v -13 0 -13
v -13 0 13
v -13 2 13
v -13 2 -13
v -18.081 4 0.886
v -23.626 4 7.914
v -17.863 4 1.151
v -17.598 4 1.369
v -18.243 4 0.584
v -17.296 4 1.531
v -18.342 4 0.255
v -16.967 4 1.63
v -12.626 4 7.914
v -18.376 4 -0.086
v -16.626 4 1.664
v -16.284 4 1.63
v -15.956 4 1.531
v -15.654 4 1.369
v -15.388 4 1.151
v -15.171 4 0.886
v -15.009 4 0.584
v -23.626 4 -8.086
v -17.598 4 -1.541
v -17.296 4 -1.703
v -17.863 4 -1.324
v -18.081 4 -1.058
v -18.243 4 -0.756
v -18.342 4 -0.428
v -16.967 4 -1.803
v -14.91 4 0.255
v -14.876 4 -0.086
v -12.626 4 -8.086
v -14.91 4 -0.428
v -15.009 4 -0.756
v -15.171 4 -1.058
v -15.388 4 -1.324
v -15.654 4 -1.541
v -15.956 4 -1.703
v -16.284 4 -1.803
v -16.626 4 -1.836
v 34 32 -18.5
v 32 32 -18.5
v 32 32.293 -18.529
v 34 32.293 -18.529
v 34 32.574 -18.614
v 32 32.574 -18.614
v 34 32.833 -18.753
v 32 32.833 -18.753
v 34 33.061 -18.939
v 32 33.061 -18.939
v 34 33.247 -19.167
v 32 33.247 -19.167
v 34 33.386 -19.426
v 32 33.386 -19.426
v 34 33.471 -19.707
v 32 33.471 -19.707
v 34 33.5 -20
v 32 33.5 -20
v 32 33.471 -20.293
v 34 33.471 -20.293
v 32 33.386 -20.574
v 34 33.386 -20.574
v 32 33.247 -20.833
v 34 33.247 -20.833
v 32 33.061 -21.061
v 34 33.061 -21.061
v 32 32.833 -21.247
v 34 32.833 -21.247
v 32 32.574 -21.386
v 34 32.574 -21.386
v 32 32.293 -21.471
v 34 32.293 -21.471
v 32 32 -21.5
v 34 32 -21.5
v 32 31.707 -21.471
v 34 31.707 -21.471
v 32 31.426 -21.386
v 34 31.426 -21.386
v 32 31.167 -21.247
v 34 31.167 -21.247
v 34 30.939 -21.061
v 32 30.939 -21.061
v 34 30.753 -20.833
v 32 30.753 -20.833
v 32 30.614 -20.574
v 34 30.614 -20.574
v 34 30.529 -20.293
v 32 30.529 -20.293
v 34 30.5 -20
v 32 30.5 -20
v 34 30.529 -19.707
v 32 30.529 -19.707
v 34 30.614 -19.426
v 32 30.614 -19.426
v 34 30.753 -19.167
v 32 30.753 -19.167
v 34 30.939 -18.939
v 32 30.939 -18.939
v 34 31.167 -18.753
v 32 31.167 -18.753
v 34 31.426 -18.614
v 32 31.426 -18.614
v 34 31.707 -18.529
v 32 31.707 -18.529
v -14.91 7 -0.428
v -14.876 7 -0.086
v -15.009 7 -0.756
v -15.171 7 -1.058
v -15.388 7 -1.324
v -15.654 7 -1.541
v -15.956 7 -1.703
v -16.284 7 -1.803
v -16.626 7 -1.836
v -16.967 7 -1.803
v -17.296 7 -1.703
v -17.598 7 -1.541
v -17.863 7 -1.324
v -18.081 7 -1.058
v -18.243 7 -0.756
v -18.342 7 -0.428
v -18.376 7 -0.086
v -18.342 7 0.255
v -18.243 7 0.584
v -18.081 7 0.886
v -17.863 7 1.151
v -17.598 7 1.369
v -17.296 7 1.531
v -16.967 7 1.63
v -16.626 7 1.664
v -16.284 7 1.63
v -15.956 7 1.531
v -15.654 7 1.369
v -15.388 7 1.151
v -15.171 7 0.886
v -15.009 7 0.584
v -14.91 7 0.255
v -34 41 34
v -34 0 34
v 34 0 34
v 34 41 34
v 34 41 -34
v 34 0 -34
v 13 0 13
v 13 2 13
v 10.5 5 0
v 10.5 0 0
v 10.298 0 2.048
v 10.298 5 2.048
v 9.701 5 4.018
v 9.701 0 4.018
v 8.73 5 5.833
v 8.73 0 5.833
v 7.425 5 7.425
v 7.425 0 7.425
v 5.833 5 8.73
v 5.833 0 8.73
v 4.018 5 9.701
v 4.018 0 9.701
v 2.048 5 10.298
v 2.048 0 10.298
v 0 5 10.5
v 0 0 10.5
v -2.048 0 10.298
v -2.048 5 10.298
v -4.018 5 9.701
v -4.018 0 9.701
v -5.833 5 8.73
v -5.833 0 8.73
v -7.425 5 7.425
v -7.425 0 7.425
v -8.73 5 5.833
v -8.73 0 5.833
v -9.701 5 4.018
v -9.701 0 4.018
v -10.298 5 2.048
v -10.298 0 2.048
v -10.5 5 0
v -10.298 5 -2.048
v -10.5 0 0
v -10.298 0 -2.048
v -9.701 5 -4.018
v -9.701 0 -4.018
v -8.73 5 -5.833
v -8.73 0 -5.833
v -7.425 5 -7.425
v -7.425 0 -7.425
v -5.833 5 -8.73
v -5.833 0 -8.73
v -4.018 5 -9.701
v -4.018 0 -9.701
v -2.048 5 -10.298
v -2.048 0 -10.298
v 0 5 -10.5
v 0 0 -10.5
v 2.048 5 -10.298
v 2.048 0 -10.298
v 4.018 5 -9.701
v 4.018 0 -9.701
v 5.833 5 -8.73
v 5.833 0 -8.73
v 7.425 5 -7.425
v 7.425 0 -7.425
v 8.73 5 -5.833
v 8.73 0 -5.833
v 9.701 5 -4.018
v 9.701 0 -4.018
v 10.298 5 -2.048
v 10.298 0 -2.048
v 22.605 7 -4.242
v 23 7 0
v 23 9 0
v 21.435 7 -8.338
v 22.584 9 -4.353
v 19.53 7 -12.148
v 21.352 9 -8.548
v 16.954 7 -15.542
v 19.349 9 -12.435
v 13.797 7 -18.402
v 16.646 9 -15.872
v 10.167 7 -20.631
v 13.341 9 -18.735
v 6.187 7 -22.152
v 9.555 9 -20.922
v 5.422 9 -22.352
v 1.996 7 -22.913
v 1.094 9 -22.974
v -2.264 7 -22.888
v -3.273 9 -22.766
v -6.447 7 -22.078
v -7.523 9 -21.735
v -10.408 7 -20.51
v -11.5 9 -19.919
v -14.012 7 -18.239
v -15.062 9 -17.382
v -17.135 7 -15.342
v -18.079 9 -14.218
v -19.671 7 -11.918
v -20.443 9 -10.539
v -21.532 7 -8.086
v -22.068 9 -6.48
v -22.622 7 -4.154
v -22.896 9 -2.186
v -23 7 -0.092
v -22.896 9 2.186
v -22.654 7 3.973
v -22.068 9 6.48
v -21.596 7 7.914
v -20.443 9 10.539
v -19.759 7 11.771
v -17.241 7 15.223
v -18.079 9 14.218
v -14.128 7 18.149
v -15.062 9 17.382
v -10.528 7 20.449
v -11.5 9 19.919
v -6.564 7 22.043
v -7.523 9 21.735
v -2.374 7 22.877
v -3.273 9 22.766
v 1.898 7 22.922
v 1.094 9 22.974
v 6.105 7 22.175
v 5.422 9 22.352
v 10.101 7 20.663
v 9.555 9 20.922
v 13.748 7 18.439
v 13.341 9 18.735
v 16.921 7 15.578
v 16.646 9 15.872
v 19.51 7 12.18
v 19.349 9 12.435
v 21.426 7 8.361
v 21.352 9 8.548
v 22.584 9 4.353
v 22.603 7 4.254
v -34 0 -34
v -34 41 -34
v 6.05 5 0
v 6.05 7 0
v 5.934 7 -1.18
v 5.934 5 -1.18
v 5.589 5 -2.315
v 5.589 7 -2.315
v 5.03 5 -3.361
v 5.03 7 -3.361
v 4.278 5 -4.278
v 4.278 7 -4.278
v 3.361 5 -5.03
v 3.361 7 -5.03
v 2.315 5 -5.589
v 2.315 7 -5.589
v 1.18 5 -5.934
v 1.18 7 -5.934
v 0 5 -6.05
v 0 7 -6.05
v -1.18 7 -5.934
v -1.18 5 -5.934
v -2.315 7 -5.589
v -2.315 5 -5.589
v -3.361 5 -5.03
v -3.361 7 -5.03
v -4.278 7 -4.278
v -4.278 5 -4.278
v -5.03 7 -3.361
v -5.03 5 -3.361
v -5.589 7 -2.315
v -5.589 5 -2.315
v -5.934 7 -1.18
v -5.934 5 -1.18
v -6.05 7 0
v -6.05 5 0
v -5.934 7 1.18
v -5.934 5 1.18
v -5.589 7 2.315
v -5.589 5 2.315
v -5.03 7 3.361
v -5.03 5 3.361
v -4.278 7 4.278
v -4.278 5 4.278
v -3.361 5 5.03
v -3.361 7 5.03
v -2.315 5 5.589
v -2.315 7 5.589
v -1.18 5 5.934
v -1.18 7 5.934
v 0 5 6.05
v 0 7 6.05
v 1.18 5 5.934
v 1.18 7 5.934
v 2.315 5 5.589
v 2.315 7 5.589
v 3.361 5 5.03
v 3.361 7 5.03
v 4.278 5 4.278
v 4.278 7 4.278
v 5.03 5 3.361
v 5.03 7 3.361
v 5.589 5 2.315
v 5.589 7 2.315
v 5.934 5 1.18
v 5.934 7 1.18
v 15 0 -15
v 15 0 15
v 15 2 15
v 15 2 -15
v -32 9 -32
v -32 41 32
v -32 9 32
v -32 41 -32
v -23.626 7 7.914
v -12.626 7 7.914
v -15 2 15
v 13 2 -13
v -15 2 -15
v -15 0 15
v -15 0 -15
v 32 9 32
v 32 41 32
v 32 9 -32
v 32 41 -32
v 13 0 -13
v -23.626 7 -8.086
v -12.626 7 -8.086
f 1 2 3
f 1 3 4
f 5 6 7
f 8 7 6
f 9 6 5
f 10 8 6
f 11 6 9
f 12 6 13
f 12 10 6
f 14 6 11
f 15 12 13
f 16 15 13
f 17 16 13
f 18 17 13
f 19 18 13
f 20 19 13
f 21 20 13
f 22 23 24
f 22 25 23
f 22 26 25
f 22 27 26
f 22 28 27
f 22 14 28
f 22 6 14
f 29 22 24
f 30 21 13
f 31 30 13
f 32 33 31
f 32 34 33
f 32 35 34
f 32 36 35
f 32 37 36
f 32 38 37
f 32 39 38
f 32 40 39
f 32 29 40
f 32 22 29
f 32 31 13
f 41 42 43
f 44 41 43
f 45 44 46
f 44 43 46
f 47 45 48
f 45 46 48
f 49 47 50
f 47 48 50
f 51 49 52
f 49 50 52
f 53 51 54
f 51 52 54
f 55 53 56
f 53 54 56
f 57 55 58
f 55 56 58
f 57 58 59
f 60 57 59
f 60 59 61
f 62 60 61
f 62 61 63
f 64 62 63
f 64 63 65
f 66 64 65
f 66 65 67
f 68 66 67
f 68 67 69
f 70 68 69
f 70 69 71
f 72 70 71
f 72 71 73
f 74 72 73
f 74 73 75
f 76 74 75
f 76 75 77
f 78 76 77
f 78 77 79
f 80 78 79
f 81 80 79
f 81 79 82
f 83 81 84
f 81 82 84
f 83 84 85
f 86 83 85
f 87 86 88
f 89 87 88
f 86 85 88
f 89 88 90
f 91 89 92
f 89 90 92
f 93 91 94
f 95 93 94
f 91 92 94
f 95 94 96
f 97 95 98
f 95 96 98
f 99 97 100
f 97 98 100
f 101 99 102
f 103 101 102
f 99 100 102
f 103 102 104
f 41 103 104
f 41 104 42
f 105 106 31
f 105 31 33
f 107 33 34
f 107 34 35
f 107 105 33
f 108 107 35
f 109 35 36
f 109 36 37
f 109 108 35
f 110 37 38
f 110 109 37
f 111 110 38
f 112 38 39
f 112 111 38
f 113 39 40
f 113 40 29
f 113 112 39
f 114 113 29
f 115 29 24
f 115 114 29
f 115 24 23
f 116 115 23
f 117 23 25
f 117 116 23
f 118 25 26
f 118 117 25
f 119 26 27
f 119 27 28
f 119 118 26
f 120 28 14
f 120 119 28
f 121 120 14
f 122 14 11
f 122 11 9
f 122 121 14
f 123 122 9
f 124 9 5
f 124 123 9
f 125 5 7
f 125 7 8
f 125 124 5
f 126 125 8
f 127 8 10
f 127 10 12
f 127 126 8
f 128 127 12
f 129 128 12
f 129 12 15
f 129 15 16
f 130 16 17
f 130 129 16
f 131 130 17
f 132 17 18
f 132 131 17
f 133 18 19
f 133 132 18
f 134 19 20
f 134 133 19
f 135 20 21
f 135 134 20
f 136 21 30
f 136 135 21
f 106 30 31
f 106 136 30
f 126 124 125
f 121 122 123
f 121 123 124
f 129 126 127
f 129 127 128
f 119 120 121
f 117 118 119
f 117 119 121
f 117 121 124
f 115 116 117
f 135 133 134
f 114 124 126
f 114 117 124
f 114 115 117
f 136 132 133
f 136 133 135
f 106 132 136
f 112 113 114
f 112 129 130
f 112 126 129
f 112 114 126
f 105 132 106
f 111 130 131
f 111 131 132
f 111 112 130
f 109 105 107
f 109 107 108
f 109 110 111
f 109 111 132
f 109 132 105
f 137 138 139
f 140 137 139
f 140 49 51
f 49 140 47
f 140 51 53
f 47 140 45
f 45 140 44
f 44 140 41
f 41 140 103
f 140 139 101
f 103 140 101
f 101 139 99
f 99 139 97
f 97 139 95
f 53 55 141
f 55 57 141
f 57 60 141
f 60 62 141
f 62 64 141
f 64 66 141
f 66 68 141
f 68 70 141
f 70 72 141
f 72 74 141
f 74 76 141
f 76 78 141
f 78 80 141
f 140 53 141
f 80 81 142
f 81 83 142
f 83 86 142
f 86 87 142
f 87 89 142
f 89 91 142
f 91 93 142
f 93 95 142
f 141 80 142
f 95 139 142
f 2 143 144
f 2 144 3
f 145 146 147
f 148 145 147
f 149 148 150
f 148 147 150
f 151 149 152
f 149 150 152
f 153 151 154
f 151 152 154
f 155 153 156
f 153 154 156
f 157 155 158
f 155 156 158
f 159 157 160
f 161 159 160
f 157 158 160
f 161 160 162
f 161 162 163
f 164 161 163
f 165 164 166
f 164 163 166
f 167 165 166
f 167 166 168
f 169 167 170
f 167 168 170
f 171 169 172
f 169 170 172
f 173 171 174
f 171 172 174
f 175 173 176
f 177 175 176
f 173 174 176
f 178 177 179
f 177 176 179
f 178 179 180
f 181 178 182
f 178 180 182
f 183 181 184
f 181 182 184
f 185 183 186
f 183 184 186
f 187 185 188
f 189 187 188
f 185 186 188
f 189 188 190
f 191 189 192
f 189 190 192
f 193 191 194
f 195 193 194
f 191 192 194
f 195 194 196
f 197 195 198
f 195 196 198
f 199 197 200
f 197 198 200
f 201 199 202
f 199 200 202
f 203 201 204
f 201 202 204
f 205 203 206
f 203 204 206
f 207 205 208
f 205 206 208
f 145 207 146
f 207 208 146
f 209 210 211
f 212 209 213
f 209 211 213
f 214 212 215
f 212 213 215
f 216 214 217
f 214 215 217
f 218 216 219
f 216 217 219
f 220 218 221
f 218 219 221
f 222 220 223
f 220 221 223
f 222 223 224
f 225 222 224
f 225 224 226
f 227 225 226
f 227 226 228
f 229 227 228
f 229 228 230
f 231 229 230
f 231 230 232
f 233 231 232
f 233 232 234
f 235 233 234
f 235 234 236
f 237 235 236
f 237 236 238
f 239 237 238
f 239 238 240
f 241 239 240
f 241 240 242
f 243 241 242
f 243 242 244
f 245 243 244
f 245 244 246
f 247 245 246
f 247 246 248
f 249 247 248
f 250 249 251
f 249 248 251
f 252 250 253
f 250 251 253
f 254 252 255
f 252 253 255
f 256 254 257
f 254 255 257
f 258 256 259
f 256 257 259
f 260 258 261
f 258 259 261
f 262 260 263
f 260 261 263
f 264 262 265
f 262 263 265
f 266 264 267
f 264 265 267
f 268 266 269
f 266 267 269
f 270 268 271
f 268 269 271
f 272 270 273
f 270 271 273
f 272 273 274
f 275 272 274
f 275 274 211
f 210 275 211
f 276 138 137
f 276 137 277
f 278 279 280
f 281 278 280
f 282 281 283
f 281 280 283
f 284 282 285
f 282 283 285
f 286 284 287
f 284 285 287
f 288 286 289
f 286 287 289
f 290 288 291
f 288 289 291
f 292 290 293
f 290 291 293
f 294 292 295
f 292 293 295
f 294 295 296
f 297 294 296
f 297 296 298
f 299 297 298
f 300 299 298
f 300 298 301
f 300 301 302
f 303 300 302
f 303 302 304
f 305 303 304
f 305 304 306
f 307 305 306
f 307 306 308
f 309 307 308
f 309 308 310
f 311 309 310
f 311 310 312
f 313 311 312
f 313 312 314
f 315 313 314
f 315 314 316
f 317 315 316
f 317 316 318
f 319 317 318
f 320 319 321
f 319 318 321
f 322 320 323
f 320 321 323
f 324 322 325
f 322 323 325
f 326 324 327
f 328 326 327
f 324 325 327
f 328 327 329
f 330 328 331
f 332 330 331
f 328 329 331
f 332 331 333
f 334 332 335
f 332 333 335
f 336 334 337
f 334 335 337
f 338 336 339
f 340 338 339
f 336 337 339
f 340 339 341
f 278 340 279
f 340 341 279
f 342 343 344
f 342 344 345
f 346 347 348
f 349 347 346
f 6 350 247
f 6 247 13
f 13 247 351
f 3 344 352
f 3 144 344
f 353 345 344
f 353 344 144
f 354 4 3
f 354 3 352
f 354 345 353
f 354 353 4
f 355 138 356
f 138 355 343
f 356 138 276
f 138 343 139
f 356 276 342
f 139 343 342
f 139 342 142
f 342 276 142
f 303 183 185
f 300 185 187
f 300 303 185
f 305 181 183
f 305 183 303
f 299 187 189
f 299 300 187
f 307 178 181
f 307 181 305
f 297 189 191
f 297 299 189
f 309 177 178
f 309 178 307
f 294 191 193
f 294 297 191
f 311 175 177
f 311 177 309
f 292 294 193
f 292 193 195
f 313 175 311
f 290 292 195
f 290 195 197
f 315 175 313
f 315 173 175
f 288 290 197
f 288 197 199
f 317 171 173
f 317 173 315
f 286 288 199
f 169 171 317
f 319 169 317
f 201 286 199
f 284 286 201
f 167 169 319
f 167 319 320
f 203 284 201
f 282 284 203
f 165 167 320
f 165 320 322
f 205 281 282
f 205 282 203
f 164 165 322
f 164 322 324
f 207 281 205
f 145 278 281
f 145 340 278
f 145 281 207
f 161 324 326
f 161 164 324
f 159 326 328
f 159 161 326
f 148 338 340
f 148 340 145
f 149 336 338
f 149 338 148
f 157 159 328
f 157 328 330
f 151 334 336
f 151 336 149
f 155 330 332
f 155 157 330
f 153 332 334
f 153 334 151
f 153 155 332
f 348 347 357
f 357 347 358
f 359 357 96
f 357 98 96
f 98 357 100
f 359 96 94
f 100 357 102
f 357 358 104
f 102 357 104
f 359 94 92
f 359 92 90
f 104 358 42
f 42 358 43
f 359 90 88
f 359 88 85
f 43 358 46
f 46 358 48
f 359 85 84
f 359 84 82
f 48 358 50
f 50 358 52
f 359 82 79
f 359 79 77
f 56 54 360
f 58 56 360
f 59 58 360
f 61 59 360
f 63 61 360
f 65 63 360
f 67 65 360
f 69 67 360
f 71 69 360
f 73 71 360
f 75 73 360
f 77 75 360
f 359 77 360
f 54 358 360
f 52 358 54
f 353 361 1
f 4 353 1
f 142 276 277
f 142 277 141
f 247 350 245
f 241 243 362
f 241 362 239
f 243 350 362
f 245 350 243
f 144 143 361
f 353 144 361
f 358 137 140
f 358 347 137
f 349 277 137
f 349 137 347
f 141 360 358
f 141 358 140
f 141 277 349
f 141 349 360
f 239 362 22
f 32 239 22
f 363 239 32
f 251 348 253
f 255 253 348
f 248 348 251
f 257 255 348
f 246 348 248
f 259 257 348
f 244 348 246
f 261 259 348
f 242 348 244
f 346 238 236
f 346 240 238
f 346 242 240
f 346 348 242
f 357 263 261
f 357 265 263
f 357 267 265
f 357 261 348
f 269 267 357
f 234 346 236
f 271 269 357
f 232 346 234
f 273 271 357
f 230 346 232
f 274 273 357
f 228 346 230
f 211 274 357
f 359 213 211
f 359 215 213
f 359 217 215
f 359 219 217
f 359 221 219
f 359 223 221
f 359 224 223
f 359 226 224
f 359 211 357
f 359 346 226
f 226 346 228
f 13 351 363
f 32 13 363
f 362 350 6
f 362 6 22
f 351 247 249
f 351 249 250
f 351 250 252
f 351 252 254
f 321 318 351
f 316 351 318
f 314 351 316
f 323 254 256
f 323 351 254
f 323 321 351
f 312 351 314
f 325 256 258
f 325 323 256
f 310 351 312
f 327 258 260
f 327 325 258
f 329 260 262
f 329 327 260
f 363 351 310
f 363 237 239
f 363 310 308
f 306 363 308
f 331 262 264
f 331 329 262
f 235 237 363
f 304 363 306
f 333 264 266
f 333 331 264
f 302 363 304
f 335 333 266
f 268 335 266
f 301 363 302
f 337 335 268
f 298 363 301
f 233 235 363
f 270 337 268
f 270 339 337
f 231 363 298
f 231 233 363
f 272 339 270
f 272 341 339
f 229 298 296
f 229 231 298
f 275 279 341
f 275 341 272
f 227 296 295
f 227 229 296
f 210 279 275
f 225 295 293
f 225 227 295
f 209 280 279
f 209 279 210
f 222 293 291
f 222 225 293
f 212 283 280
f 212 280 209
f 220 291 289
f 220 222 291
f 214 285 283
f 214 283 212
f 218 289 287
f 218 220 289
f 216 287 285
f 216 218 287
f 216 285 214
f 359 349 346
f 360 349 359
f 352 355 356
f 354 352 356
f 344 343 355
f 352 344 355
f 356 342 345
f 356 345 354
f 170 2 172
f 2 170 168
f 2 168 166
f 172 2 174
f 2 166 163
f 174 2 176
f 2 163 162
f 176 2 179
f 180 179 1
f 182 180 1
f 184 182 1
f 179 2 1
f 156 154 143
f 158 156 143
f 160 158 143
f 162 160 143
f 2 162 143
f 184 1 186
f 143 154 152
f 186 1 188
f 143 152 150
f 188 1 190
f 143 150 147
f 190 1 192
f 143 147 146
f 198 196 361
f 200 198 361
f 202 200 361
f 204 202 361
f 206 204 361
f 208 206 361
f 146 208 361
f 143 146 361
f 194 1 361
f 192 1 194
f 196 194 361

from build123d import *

# Parameters (mm, degrees)
SKETCH1_W           = 68
SKETCH1_H           = 68
BOSS_EXTRUDE1_DEPTH = 41
CUT_EXTRUDE1_START  = 41
SKETCH2_W           = 64
SKETCH2_H           = 64
CUT_EXTRUDE1_DEPTH  = 32
CUT_EXTRUDE4_START  = 9
SKETCH3_R           = 23
CUT_EXTRUDE4_DEPTH  = 2
CUT_EXTRUDE9_START  = 7
SKETCH5_R           = 6.05
CUT_EXTRUDE9_DEPTH  = 8
SKETCH6_R           = 10.5
CUT_EXTRUDE10_DEPTH = 5
SKETCH7_W           = 30
SKETCH7_H           = 30
SKETCH7_W_2         = 26
SKETCH7_H_2         = 26
CUT_EXTRUDE11_DEPTH = 2
SKETCH8_R           = 1.5
CUT_EXTRUDE12_DEPTH = 3
SKETCH4_W           = 11
SKETCH4_H           = 16
SKETCH4_R           = 1.75
CUT_EXTRUDE13_DEPTH = 3


with BuildPart() as part:
    # Sketch1 → Boss-Extrude1 (new body)
    with BuildSketch(Plane(origin=(0, 0, 0), x_dir=(1, 0, 0), z_dir=(0, 1, 0))):
        Rectangle(SKETCH1_W, SKETCH1_H)
    extrude(amount=BOSS_EXTRUDE1_DEPTH)

    # Sketch2 → Cut-Extrude1 (cut)
    with BuildSketch(Plane(origin=(0, 0, 0), x_dir=(1, 0, 0), z_dir=(0, 1, 0)).offset(CUT_EXTRUDE1_START)):
        Rectangle(SKETCH2_W, SKETCH2_H)
    extrude(amount=-CUT_EXTRUDE1_DEPTH, mode=Mode.SUBTRACT)

    # Sketch3 → Cut-Extrude4 (cut)
    with BuildSketch(Plane(origin=(0, 0, 0), x_dir=(1, 0, 0), z_dir=(0, 1, 0)).offset(CUT_EXTRUDE4_START)):
        Circle(SKETCH3_R)
    extrude(amount=-CUT_EXTRUDE4_DEPTH, mode=Mode.SUBTRACT)

    # Sketch5 → Cut-Extrude9 (cut, through all)
    with BuildSketch(Plane(origin=(0, 0, 0), x_dir=(1, 0, 0), z_dir=(0, 1, 0)).offset(CUT_EXTRUDE9_START)):
        Circle(SKETCH5_R)
    extrude(amount=-CUT_EXTRUDE9_DEPTH, mode=Mode.SUBTRACT)

    # Sketch6 → Cut-Extrude10 (cut)
    with BuildSketch(Plane.XZ):
        Circle(SKETCH6_R)
    extrude(amount=-CUT_EXTRUDE10_DEPTH, mode=Mode.SUBTRACT)

    # Sketch7 → Cut-Extrude11 (cut)
    with BuildSketch(Plane(origin=(0, 0, 0), x_dir=(-1, 0, 0), z_dir=(0, -1, 0))):
        Rectangle(SKETCH7_W, SKETCH7_H)
        Rectangle(SKETCH7_W_2, SKETCH7_H_2, mode=Mode.SUBTRACT)
    extrude(amount=-CUT_EXTRUDE11_DEPTH, mode=Mode.SUBTRACT)

    # Sketch8 → Cut-Extrude12 (cut, through all)
    with BuildSketch(Plane.ZY.offset(-32)):
        with Locations((-20, 32)):
            Circle(SKETCH8_R)
    extrude(amount=-CUT_EXTRUDE12_DEPTH, mode=Mode.SUBTRACT)

    # Sketch4 → Cut-Extrude13 (cut)
    with BuildSketch(Plane(origin=(0, 7, 0), x_dir=(1, 0, 0), z_dir=(0, 1, 0))):
        with Locations((-18.125903529, 0.086164087)):
            Rectangle(SKETCH4_W, SKETCH4_H)
        with Locations((-16.625903529, 0.086164087)):
            Circle(SKETCH4_R, mode=Mode.SUBTRACT)
    extrude(amount=-CUT_EXTRUDE13_DEPTH, mode=Mode.SUBTRACT)


solid = part.part
